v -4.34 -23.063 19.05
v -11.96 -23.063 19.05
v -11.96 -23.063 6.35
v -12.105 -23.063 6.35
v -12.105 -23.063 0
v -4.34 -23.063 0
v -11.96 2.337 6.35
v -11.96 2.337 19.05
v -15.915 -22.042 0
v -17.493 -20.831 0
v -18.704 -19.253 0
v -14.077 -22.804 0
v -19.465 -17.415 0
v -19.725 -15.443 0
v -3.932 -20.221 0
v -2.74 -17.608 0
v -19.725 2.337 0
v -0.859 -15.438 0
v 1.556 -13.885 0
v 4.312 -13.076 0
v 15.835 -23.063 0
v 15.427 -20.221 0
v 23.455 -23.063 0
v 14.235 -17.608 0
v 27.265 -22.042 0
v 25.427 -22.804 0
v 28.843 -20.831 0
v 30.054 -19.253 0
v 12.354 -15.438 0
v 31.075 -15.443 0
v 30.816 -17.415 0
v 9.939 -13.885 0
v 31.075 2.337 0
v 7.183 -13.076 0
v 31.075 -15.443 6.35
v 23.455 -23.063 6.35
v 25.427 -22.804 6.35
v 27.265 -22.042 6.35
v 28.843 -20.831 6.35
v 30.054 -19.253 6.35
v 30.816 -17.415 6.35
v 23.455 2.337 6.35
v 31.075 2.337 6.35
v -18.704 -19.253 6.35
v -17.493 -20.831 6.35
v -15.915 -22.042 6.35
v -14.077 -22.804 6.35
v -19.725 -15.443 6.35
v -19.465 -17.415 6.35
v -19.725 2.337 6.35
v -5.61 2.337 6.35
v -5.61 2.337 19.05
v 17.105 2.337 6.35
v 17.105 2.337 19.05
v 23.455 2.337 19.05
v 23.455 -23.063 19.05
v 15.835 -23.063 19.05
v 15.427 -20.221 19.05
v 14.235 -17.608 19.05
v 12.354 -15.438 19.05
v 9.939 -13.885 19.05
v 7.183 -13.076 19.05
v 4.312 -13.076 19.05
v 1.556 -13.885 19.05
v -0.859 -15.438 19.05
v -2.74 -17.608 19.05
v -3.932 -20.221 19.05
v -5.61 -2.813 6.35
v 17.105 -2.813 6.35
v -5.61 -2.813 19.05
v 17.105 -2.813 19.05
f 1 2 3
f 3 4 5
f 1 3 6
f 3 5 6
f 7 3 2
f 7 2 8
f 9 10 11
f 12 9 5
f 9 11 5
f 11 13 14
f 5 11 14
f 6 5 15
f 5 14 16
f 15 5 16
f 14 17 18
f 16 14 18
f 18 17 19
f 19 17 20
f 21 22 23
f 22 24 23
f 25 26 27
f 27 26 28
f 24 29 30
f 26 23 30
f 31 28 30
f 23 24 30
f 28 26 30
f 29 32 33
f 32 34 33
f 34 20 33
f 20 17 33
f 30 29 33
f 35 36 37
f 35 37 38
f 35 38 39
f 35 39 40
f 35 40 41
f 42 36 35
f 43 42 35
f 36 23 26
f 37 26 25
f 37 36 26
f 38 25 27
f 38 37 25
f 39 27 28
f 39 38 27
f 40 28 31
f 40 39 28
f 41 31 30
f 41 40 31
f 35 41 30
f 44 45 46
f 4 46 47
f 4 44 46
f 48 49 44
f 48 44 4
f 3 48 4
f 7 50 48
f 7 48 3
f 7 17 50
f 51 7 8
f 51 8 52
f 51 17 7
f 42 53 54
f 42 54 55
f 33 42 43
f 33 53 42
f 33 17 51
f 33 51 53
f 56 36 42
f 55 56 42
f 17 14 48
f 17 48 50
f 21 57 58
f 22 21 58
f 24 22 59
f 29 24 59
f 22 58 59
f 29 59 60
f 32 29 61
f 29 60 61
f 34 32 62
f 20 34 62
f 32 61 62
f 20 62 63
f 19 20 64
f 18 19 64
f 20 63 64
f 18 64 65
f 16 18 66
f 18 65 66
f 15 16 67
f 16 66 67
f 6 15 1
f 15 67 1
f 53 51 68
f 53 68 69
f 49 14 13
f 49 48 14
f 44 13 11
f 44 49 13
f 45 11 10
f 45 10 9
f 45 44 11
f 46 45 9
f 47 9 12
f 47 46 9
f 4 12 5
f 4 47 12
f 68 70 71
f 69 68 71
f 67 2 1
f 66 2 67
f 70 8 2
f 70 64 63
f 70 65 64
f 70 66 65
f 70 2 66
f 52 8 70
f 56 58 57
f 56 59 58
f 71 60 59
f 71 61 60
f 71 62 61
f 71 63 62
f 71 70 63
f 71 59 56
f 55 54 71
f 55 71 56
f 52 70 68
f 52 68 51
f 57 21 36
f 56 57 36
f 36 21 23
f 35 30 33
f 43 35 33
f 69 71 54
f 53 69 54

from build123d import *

# Parameters (mm, degrees)
F0_W     = 50.8
F0_H     = 25.4
F1_DEPTH = 6.35
F2_R     = 7.62
F3_W     = 35.415467
F3_H     = 25.4
F4_DEPTH = 12.7
F6_DEPTH = 19.051
F7_W     = 22.715467
F7_H     = 5.149726
F8_DEPTH = 12.7


with BuildPart() as f1:
    # F0 (on Top) → F1 (new body)
    with BuildSketch(Plane.XY):
        with Locations((5.675177, -10.363199)):
            Rectangle(F0_W, F0_H)
    extrude(amount=F1_DEPTH)

    # F2
    f2_edges = [f1.edges().sort_by_distance(p)[0] for p in [
        (-19.724823, -23.063199, 3.175),
        (31.075177, -23.063199, 3.175),
    ]]
    fillet(f2_edges, radius=F2_R)

    # F3 (on face) → F4 (join)
    with BuildSketch(Plane.XY.offset(6.35)):
        with Locations((5.747444, -10.363199)):
            Rectangle(F3_W, F3_H)
    extrude(amount=F4_DEPTH)

    # F5 (on face) → F6 (cut, through all)
    with BuildSketch(Plane.XY.offset(19.05)):
        with BuildLine():
            Line((-4.34029, -23.063199), (15.835177, -23.063199))
            ThreePointArc((15.835177, -23.063199), (5.747443, -12.972925), (-4.34029, -23.063199))
        make_face()
    extrude(amount=-F6_DEPTH, mode=Mode.SUBTRACT)

    # F7 (on face) → F8 (cut)
    with BuildSketch(Plane.XY.offset(19.05)):
        with Locations((5.747443, -0.238062)):
            Rectangle(F7_W, F7_H)
    extrude(amount=-F8_DEPTH, mode=Mode.SUBTRACT)


solid = f1.part
